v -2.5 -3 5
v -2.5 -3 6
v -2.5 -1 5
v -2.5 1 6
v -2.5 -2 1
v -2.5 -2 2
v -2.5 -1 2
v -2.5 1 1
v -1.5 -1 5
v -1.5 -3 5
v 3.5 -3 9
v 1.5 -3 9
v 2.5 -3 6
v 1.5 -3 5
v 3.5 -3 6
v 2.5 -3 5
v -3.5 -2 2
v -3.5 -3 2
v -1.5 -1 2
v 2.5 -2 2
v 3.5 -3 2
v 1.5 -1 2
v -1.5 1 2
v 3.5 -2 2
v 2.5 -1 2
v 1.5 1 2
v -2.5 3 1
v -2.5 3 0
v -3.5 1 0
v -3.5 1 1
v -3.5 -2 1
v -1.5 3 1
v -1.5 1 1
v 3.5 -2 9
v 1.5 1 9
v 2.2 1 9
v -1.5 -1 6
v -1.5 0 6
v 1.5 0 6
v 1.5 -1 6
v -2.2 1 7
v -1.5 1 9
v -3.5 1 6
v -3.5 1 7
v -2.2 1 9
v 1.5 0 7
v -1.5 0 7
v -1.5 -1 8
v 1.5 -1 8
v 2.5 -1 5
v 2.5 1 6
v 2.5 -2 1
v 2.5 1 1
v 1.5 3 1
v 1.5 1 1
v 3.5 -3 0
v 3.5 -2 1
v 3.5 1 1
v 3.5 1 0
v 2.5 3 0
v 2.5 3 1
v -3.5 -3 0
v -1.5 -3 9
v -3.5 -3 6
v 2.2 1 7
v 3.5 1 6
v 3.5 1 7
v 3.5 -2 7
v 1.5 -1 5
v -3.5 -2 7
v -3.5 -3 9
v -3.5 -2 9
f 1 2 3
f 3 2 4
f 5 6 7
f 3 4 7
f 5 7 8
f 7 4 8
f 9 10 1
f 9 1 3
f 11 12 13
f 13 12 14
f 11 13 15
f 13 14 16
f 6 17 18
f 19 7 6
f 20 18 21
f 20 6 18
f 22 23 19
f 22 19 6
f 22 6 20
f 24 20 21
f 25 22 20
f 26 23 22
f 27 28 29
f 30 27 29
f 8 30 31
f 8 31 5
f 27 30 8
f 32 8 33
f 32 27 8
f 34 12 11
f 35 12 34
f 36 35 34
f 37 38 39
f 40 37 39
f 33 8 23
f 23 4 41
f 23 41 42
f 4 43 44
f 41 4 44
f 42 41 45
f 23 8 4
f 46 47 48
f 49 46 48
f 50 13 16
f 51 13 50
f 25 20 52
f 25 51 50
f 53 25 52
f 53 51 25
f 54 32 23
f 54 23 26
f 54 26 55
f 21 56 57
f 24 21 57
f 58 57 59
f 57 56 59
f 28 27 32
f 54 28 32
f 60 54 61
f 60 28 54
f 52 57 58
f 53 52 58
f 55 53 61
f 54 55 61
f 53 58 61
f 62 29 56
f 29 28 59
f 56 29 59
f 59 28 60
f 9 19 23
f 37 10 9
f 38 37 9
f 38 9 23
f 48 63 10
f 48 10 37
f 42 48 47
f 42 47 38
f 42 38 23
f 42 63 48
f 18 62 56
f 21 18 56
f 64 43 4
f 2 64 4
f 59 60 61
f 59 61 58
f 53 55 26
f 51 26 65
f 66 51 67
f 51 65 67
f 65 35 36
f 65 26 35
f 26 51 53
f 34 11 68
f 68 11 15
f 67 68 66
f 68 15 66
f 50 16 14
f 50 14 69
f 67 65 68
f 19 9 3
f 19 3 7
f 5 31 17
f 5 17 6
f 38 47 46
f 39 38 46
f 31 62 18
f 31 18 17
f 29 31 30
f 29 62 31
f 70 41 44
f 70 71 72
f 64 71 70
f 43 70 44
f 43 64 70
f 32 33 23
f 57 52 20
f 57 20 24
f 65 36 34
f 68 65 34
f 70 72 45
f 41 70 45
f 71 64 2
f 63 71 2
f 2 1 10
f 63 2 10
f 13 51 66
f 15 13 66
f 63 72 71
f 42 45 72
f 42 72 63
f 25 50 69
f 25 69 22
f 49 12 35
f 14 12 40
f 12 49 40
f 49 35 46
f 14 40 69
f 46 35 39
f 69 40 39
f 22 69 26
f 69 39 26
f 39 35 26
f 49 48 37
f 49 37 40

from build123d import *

# Parameters (mm, degrees)
SKETCH1_W           = 7
SKETCH1_H           = 6
BOSS_EXTRUDE1_DEPTH = 9
SKETCH2_W           = 3
SKETCH2_H           = 1
CUT_EXTRUDE10_DEPTH = 7
CUT_EXTRUDE11_DEPTH = 1
SKETCH12_W          = 1
SKETCH12_H          = 1
CUT_EXTRUDE12_DEPTH = 5
SKETCH13_W          = 1
SKETCH13_H          = 4
CUT_EXTRUDE13_DEPTH = 7
CUT_EXTRUDE14_DEPTH = 2
SKETCH15_W          = 3
SKETCH15_H          = 2
CUT_EXTRUDE17_DEPTH = 6
SKETCH18_W          = 3
SKETCH18_H          = 1
CUT_EXTRUDE18_DEPTH = 6
SKETCH20_W          = 3
SKETCH20_H          = 3.16227766
CUT_EXTRUDE19_DEPTH = 6
SKETCH21_W          = 3
SKETCH21_H          = 4
CUT_EXTRUDE20_DEPTH = 6
SKETCH22_W          = 3
SKETCH22_H          = 1
CUT_EXTRUDE22_DEPTH = 6
SKETCH23_W          = 7
SKETCH23_H          = 2
CUT_EXTRUDE24_DEPTH = 7
SKETCH24_W          = 3
SKETCH24_H          = 1
CUT_EXTRUDE25_DEPTH = 2
SKETCH25_W          = 3
SKETCH25_H          = 1
CUT_EXTRUDE26_DEPTH = 2
SKETCH28_W          = 3
SKETCH28_H          = 2.236067977
CUT_EXTRUDE27_DEPTH = 2
SKETCH29_W          = 1
SKETCH29_H          = 2
CUT_EXTRUDE28_DEPTH = 1
SKETCH30_W          = 1
SKETCH30_H          = 2
CUT_EXTRUDE29_DEPTH = 1
SKETCH31_W          = 3
SKETCH31_H          = 2
CUT_EXTRUDE30_DEPTH = 40
CUT_EXTRUDE31_DEPTH = 3


with BuildPart() as part:
    # Sketch1 → Boss-Extrude1 (new body)
    with BuildSketch(Plane.XY):
        Rectangle(SKETCH1_W, SKETCH1_H)
    extrude(amount=BOSS_EXTRUDE1_DEPTH)

    # Sketch2 → Cut-Extrude10 (cut, through all)
    with BuildSketch(Plane(origin=(0, 3, 0), x_dir=(1, 0, 0), z_dir=(0, 1, 0))):
        with Locations((0, -8.5)):
            Rectangle(SKETCH2_W, SKETCH2_H)
    extrude(amount=-CUT_EXTRUDE10_DEPTH, mode=Mode.SUBTRACT)

    # Sketch11 → Cut-Extrude11 (cut)
    with BuildSketch(Plane(origin=(0, 0, 0), x_dir=(-1, 0, 0), z_dir=(0, 0, -1))):
        Polygon((-2.5, 3), (-3.5, 1), (-3.5, 3), align=None)
        Polygon((3.5, 3), (2.5, 3), (3.5, 1), align=None)
    extrude(amount=-CUT_EXTRUDE11_DEPTH, mode=Mode.SUBTRACT)

    # Sketch12 → Cut-Extrude12 (cut)
    with BuildSketch(Plane(origin=(0, 3, 0), x_dir=(1, 0, 0), z_dir=(0, 1, 0))):
        with Locations((3, -1.5)):
            Rectangle(SKETCH12_W, SKETCH12_H)
        with Locations((-3, -1.5)):
            Rectangle(SKETCH12_W, SKETCH12_H)
    extrude(amount=-CUT_EXTRUDE12_DEPTH, mode=Mode.SUBTRACT)

    # Sketch13 → Cut-Extrude13 (cut, through all)
    with BuildSketch(Plane(origin=(0, 3, 0), x_dir=(1, 0, 0), z_dir=(0, 1, 0))):
        with Locations((3, -4)):
            Rectangle(SKETCH13_W, SKETCH13_H)
        with Locations((-3, -4)):
            Rectangle(SKETCH13_W, SKETCH13_H)
    extrude(amount=-CUT_EXTRUDE13_DEPTH, mode=Mode.SUBTRACT)

    # Sketch14 → Cut-Extrude14 (cut)
    with BuildSketch(Plane.XY.offset(9)):
        Polygon((3.5, 3), (2.5, 3), (3.5, -2), align=None)
        Polygon((-3.5, 3), (-2.5, 3), (-3.5, -2), align=None)
    extrude(amount=-CUT_EXTRUDE14_DEPTH, mode=Mode.SUBTRACT)

    # Sketch15 → Cut-Extrude17 (cut)
    with BuildSketch(Plane.XY.offset(8)):
        with Locations((0, -2)):
            Rectangle(SKETCH15_W, SKETCH15_H)
    extrude(amount=-CUT_EXTRUDE17_DEPTH, mode=Mode.SUBTRACT)

    # Sketch18 → Cut-Extrude18 (cut)
    with BuildSketch(Plane.XY.offset(8)):
        with Locations((0, 2.5)):
            Rectangle(SKETCH18_W, SKETCH18_H)
    extrude(amount=-CUT_EXTRUDE18_DEPTH, mode=Mode.SUBTRACT)

    # Sketch20 → Cut-Extrude19 (cut)
    with BuildSketch(Plane(origin=(0, 2.3, 6.9), x_dir=(-1, 0, 0), z_dir=(0, -0.316227766, -0.948683298))):
        with Locations((0, -1.897366596)):
            Rectangle(SKETCH20_W, SKETCH20_H)
    extrude(amount=-CUT_EXTRUDE19_DEPTH, mode=Mode.SUBTRACT)

    # Sketch21 → Cut-Extrude20 (cut, through all)
    with BuildSketch(Plane(origin=(0, 2, 0), x_dir=(1, 0, 0), z_dir=(0, 1, 0))):
        with Locations((0, -4)):
            Rectangle(SKETCH21_W, SKETCH21_H)
    extrude(amount=-CUT_EXTRUDE20_DEPTH, mode=Mode.SUBTRACT)

    # Sketch22 → Cut-Extrude22 (cut)
    with BuildSketch(Plane.XY.offset(9)):
        with Locations((0, 1.5)):
            Rectangle(SKETCH22_W, SKETCH22_H)
    extrude(amount=-CUT_EXTRUDE22_DEPTH, mode=Mode.SUBTRACT)

    # Sketch23 → Cut-Extrude24 (cut)
    with BuildSketch(Plane.XY.offset(9)):
        with Locations((0, 2)):
            Rectangle(SKETCH23_W, SKETCH23_H)
    extrude(amount=-CUT_EXTRUDE24_DEPTH, mode=Mode.SUBTRACT)

    # Sketch24 → Cut-Extrude25 (cut)
    with BuildSketch(Plane.XY.offset(9)):
        Polygon((2.2, 1), (3.5, -2), (2.9, 1), align=None)
        Polygon((-2.2, 1), (-2.9, 1), (-3.5, -2), align=None)
        with Locations((0, 0.5)):
            Rectangle(SKETCH24_W, SKETCH24_H)
    extrude(amount=-CUT_EXTRUDE25_DEPTH, mode=Mode.SUBTRACT)

    # Sketch25 → Cut-Extrude26 (cut)
    with BuildSketch(Plane.XY.offset(7)):
        with Locations((0, 0.5)):
            Rectangle(SKETCH25_W, SKETCH25_H)
    extrude(amount=-CUT_EXTRUDE26_DEPTH, mode=Mode.SUBTRACT)

    # Sketch28 → Cut-Extrude27 (cut)
    with BuildSketch(Plane(origin=(0, 1, 2), x_dir=(1, 0, 0), z_dir=(0, 0.447213595, 0.894427191))):
        with Locations((0, 1.118033989)):
            Rectangle(SKETCH28_W, SKETCH28_H)
    extrude(amount=CUT_EXTRUDE27_DEPTH, mode=Mode.SUBTRACT)

    # Sketch29 → Cut-Extrude28 (cut)
    with BuildSketch(Plane(origin=(2.5, 0, 0), x_dir=(0, 0, -1), z_dir=(1, 0, 0))):
        with Locations((-1.5, 2)):
            Rectangle(SKETCH29_W, SKETCH29_H)
    extrude(amount=-CUT_EXTRUDE28_DEPTH, mode=Mode.SUBTRACT)

    # Sketch30 → Cut-Extrude29 (cut)
    with BuildSketch(Plane.ZY.offset(2.5)):
        with Locations((1.5, 2)):
            Rectangle(SKETCH30_W, SKETCH30_H)
    extrude(amount=-CUT_EXTRUDE29_DEPTH, mode=Mode.SUBTRACT)

    # Sketch31 → Cut-Extrude30 (cut)
    with BuildSketch(Plane(origin=(2.5, 0, 0), x_dir=(0, 0, -1), z_dir=(1, 0, 0))):
        with Locations((-3.5, -2)):
            Rectangle(SKETCH31_W, SKETCH31_H)
    extrude(amount=-CUT_EXTRUDE30_DEPTH, mode=Mode.SUBTRACT)

    # Sketch33 → Cut-Extrude31 (cut)
    with BuildSketch(Plane(origin=(-1.5, 0, 0), x_dir=(0, 0, -1), z_dir=(1, 0, 0))):
        Polygon((-7, 0), (-8, -1), (-8.435720839, 0.362085591), align=None)
    extrude(amount=CUT_EXTRUDE31_DEPTH, mode=Mode.SUBTRACT)


solid = part.part
